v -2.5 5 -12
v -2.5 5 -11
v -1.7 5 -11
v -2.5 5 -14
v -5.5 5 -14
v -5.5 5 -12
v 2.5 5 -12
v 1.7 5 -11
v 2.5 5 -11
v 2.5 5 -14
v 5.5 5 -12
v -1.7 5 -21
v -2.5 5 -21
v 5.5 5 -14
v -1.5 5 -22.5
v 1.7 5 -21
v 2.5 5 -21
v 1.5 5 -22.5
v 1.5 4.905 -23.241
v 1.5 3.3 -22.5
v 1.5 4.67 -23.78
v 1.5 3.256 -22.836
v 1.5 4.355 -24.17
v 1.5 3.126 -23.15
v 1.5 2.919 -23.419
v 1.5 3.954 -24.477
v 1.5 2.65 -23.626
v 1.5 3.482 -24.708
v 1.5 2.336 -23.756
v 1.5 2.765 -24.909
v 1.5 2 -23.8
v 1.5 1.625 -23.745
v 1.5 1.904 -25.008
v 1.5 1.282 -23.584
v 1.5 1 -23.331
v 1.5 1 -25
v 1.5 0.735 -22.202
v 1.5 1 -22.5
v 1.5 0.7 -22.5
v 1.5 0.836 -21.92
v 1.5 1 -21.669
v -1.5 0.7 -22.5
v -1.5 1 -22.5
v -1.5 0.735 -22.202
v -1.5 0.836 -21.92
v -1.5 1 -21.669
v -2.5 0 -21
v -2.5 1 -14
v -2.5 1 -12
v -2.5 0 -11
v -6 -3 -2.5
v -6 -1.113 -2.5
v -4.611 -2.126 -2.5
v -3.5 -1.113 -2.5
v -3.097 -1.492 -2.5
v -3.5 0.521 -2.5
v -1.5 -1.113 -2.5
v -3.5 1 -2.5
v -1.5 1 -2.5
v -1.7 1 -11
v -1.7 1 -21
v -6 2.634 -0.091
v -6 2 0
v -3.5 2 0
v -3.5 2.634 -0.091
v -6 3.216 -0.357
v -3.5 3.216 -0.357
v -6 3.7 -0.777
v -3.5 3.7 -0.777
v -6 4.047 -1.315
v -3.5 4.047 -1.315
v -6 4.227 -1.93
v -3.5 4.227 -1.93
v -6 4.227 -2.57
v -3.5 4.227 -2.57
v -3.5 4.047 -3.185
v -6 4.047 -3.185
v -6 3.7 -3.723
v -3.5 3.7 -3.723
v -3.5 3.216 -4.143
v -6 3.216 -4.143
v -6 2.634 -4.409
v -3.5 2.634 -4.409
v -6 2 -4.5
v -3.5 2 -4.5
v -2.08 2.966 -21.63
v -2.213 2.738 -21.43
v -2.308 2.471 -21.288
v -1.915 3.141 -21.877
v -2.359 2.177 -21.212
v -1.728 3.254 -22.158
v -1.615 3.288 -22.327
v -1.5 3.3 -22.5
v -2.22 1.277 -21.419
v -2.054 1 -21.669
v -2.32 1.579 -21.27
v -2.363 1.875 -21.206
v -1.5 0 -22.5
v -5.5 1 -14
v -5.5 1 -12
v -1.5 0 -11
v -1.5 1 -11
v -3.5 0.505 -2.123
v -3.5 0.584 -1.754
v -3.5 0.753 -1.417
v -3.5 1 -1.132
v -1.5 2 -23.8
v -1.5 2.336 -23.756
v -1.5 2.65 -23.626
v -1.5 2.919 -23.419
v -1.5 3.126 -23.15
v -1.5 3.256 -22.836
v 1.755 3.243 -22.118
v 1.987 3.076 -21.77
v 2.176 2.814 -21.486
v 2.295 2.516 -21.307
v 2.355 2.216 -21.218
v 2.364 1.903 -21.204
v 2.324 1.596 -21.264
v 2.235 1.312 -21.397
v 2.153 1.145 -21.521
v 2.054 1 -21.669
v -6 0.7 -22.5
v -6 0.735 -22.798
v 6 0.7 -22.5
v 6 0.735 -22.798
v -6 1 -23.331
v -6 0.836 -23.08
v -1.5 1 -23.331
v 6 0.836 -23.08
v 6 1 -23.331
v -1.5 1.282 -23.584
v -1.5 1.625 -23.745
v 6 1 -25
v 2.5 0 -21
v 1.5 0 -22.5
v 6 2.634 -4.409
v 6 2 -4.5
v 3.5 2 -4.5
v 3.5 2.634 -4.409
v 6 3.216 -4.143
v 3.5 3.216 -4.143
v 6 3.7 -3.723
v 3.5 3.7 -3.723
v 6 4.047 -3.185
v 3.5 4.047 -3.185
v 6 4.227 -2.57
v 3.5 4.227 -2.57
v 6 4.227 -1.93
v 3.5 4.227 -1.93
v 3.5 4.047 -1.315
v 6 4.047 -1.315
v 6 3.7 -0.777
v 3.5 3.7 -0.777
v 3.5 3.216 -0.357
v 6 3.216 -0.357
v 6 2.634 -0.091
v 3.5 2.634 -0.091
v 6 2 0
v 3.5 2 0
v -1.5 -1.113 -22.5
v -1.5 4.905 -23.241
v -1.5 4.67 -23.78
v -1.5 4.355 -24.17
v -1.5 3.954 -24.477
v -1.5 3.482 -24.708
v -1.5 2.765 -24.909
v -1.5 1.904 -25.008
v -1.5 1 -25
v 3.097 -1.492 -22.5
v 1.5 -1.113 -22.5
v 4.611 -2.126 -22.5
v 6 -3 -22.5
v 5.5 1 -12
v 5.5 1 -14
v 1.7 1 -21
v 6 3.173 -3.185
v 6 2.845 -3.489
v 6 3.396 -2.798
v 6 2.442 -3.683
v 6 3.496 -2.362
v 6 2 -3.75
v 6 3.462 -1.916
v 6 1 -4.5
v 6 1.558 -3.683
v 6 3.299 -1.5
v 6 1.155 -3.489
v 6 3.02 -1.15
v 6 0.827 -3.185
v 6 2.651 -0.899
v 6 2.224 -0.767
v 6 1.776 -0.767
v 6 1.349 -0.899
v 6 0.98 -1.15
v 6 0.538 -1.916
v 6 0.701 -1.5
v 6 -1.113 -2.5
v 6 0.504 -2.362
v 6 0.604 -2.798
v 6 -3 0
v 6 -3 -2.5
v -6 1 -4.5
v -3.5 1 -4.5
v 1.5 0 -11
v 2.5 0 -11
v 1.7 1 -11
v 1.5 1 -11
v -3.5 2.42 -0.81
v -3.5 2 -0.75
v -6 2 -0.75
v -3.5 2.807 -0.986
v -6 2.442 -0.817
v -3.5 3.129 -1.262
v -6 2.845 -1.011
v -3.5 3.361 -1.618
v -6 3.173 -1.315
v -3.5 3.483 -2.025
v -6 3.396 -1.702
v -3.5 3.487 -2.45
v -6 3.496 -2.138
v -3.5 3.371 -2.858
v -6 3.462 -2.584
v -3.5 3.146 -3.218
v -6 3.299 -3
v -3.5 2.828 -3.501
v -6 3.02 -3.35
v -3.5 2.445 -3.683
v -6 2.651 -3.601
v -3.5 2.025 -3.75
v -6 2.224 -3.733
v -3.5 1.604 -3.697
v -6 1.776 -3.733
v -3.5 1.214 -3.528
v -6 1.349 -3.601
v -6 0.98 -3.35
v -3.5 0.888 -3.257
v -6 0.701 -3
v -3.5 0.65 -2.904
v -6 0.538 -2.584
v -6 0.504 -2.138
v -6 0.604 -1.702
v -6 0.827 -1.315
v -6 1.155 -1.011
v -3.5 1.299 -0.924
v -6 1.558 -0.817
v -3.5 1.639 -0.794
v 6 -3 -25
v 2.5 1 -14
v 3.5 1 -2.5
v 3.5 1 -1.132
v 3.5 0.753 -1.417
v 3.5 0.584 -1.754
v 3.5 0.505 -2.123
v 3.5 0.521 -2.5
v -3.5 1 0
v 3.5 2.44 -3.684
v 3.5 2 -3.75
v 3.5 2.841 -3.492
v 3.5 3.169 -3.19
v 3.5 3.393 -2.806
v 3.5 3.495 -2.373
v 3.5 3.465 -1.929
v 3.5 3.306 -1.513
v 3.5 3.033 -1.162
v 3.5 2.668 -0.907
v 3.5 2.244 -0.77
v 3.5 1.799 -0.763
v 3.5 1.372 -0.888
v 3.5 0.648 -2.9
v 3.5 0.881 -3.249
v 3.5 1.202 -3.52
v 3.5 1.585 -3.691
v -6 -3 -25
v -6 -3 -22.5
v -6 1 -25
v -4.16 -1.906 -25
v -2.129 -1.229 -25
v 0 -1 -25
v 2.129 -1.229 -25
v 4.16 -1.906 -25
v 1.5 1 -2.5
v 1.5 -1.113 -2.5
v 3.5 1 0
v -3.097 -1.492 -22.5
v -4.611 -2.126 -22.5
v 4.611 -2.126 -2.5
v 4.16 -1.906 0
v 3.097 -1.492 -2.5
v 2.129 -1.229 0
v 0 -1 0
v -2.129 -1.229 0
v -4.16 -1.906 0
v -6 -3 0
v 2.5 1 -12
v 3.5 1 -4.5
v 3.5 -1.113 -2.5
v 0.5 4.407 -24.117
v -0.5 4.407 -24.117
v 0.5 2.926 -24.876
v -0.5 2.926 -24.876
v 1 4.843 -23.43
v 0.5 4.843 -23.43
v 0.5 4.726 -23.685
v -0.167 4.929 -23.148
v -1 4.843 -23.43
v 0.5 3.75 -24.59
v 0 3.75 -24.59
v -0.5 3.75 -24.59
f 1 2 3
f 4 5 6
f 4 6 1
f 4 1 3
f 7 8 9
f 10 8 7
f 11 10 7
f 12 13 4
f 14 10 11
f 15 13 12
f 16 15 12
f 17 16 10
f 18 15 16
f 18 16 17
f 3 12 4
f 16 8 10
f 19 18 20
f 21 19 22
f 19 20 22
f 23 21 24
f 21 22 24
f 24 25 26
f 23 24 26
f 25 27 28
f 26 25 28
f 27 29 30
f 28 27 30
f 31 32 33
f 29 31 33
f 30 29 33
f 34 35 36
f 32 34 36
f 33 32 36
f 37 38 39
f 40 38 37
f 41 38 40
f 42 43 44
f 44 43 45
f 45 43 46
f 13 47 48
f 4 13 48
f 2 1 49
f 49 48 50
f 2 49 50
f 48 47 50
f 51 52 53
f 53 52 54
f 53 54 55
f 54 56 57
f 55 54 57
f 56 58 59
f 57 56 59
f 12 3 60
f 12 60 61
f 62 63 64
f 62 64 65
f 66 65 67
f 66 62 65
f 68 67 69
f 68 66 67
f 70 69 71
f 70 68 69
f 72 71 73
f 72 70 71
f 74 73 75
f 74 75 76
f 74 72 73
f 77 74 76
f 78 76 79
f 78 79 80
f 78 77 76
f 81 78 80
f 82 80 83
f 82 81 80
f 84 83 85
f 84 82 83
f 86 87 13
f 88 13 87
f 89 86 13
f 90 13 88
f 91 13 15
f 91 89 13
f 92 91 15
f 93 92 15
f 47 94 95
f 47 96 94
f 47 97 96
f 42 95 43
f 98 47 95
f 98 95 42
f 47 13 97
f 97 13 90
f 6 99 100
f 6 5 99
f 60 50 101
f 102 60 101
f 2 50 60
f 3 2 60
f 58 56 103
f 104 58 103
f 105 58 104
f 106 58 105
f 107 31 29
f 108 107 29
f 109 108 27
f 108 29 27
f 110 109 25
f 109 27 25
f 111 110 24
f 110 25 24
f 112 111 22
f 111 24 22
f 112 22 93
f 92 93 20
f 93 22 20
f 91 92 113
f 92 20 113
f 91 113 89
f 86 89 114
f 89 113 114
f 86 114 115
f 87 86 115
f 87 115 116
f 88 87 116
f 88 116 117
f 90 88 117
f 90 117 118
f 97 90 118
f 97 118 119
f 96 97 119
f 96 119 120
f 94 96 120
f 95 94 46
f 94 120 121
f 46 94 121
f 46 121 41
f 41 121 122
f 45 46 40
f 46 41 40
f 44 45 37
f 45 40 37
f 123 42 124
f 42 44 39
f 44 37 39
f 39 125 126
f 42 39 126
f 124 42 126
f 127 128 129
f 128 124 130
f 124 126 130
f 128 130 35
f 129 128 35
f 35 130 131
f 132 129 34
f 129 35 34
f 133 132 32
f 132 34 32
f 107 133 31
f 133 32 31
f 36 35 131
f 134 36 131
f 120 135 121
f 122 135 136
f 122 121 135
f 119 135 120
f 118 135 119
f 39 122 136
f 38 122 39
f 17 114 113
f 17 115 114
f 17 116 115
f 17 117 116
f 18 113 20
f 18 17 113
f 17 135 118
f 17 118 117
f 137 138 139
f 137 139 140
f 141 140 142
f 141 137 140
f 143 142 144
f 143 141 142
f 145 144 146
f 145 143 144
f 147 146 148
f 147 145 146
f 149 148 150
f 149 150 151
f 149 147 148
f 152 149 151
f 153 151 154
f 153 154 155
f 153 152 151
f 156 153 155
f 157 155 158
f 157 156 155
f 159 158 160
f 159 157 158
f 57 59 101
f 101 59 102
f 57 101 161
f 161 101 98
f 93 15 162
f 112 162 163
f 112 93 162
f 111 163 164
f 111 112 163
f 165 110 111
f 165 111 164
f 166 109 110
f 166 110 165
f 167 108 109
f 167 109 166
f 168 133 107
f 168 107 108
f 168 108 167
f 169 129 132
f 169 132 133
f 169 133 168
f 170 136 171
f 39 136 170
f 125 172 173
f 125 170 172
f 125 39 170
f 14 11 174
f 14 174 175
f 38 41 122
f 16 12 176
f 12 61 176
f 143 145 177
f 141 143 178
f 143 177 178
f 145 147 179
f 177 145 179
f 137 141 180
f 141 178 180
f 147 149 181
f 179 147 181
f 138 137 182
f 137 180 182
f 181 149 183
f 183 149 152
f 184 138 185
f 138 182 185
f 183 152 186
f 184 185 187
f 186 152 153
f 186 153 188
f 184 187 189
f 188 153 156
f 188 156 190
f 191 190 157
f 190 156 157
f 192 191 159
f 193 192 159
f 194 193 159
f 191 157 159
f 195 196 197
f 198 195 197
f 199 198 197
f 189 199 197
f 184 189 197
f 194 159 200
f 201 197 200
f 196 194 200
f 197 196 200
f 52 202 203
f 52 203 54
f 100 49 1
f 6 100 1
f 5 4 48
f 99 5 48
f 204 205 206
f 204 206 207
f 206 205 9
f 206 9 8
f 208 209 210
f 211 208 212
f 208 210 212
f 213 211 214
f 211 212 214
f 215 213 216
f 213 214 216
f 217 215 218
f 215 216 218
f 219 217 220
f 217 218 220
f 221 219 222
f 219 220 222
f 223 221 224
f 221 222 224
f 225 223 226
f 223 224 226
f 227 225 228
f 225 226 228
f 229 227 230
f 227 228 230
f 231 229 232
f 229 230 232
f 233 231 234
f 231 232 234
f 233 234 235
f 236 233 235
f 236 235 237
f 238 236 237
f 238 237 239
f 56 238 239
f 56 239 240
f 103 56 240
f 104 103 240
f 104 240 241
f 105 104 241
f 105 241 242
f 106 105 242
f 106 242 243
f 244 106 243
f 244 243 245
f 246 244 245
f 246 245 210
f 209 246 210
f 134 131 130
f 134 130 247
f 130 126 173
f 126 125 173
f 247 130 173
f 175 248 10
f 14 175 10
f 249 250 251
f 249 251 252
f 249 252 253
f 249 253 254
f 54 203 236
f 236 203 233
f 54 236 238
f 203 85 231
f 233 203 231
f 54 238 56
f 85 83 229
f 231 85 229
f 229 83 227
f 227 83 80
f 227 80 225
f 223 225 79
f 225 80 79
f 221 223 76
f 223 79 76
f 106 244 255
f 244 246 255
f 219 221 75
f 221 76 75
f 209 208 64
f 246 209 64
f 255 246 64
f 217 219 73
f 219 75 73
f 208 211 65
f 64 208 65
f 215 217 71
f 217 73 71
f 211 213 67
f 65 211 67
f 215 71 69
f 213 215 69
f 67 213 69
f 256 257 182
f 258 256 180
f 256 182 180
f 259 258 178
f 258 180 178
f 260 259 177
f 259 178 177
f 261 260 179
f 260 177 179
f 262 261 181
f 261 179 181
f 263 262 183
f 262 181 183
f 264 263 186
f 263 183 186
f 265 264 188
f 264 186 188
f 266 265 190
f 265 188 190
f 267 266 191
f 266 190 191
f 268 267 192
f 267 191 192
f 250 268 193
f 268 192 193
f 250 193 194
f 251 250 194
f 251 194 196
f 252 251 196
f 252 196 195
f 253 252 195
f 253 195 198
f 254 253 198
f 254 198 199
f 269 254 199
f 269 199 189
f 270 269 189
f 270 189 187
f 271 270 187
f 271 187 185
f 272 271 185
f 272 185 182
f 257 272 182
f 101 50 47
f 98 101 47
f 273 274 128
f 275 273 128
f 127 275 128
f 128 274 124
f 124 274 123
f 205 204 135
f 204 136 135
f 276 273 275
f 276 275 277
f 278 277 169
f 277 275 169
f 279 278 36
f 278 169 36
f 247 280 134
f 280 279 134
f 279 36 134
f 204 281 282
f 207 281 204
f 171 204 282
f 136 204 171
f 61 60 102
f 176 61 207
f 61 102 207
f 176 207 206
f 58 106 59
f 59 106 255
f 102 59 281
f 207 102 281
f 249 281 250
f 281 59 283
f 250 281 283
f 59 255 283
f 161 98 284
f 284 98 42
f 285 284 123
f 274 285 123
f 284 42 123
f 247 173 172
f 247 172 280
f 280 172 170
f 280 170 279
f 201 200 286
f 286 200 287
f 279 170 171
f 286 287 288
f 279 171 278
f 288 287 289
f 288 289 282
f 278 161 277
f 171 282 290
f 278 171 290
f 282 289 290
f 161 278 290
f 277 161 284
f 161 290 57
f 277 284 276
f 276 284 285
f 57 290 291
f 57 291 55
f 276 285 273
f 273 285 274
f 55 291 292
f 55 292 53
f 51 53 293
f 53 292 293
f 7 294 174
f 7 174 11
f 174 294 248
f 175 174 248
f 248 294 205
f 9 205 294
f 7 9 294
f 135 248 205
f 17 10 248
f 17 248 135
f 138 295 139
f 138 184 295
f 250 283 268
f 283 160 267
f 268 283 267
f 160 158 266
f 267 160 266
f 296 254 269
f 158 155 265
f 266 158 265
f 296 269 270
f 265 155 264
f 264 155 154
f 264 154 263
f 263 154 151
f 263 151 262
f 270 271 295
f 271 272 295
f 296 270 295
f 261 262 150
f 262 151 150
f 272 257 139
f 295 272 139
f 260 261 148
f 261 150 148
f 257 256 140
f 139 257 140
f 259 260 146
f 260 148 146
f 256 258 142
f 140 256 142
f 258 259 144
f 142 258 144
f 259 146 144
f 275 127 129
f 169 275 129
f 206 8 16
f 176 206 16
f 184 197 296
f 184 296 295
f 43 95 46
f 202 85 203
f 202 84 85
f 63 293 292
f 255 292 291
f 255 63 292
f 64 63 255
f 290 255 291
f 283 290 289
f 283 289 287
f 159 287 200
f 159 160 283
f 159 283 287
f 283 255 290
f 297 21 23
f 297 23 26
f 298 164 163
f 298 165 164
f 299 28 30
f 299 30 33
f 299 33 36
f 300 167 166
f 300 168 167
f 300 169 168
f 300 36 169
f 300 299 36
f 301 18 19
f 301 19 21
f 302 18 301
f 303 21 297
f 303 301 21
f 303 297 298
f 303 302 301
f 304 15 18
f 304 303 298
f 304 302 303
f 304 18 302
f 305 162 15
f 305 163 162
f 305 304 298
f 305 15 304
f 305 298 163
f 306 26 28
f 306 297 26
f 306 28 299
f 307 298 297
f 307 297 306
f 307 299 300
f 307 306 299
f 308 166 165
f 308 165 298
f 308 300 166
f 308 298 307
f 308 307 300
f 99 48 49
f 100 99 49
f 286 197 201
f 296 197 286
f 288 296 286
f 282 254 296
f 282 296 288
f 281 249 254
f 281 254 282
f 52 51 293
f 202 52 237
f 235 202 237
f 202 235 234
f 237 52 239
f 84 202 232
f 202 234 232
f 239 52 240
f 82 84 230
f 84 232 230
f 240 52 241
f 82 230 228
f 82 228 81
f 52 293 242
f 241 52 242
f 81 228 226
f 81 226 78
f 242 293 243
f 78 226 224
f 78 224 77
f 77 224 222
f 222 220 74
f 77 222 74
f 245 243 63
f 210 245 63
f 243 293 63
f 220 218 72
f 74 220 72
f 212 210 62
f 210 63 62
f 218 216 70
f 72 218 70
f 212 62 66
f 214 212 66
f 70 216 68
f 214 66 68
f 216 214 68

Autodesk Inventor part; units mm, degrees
ref_plane "YZ Plane" through (0, 0, 0) normal (1, 0, 0) x (0, 1, 0)
ref_plane "XZ Plane" through (0, 0, 0) normal (0, 1, 0) x (-1, 0, 0)
sketch "Sketch1" plane through (0, 0, 0) normal (0, 0, 1) x (1, 0, 0)
  line L0 (-6, 1) -> (6, 1)
  line L1 (6, 1) -> (6, -1)
  line L2 (6, -1) -> (-6, -1)
  line L3 (-6, -1) -> (-6, 1)
  line L4 (-6, 1) -> (6, -1) construction
  line L5 (6, 1) -> (-6, -1) construction
  line L6 (-6, -1) -> (-6, -3)
  line L7 (6, -1) -> (6, -3)
  arc A0 (6, -3) -> (-6, -3) centre (0, -11) ccw
  point P0 (0, 0)
  dimension "d0" = 12
  dimension "d1" = 2
  dimension "d2" = 2
  dimension "d3" = 2
extrude "Extrusion1" add sketch "Sketch1" against normal blind 25
sketch "Sketch2" plane through (-6, 1, 0) normal (0, 1, 0) x (1, 0, 0)
  line L0 (12, 0) -> (12, 25) projected
  line L1 (0, 0) -> (0, 25) projected
  line L2 (0, 0) -> (0, 2.5)
  line L3 (12, 0) -> (12, 2.5)
  line L4 (0, 25) -> (0, 22.5)
  line L5 (12, 25) -> (12, 22.5)
  line L6 (0, 2.5) -> (4.5, 2.5)
  line L7 (4.5, 2.5) -> (4.5, 22.5)
  line L8 (4.5, 22.5) -> (0, 22.5)
  line L9 (0, 22.5) -> (0, 2.5)
  line L10 (12, 2.5) -> (7.5, 2.5)
  line L11 (7.5, 2.5) -> (7.5, 22.5)
  line L12 (7.5, 22.5) -> (12, 22.5)
  line L13 (12, 22.5) -> (12, 2.5)
  point P0 (6, 0)
  dimension "d6" = 2.5
  dimension "d7" = 2.5
  dimension "d8" = 2.5
  dimension "d9" = 2.5
  dimension "d10" = 12
  dimension "d11" = 4.5
  dimension "d12" = 4.5
extrude "Extrusion2" cut sketch "Sketch2" against normal blind 25
sketch "Sketch3" plane through (-6, 1, 0) normal (0, 1, 0) x (1, 0, 0)
  line L0 (7.5, 2.5) -> (7.5, 22.5) projected
  line L1 (4.5, 22.5) -> (4.5, 2.5) projected
  line L2 (0, 0) -> (0, 2.5) projected
  line L3 (4.5, 2.5) -> (4.5, 3.5)
  line L4 (7.5, 2.5) -> (7.5, 3.5)
  line L5 (4.5, 3.5) -> (4.5, 5)
  line L6 (4.5, 5) -> (5, 5)
  line L7 (5, 5) -> (5, 3.5)
  line L8 (5, 3.5) -> (4.5, 3.5)
  line L9 (7.5, 3.5) -> (7.5, 5)
  line L10 (7.5, 5) -> (7, 5)
  line L11 (7, 5) -> (7, 3.5)
  line L12 (7, 3.5) -> (7.5, 3.5)
  line L13 (4.5, 2.5) -> (4.5, 7)
  line L14 (4.5, 7) -> (0, 7)
  line L15 (0, 7) -> (0, 8.5)
  line L16 (0, 8.5) -> (4.5, 8.5)
  line L17 (7.5, 7) -> (12, 7)
  line L18 (12, 7) -> (12, 8.5)
  line L19 (12, 8.5) -> (7.5, 8.5)
  line L20 (4.5, 7) -> (4.5, 21)
  line L21 (7.5, 7) -> (7.5, 21)
  line L22 (4.5, 21) -> (7.5, 21)
  line L23 (7.5, 21) -> (7.5, 22.5)
  line L24 (7.5, 22.5) -> (4.5, 22.5)
  line L25 (4.5, 22.5) -> (4.5, 21)
  line L26 (4.5, 21) -> (3.5, 21)
  line L27 (3.5, 21) -> (3.5, 11)
  line L28 (3.5, 11) -> (4.5, 11)
  line L29 (4.5, 11) -> (4.5, 21)
  line L30 (7.5, 21) -> (8.5, 21)
  line L31 (8.5, 21) -> (8.5, 11)
  line L32 (8.5, 11) -> (7.5, 11)
  line L33 (7.5, 11) -> (7.5, 21)
  line L34 (3.5, 21) -> (4.5, 22.5)
  line L35 (7.5, 22.5) -> (8.5, 21)
  line L36 (7.5, 5) -> (8, 5)
  line L37 (8, 5) -> (8, 3.5)
  line L38 (8, 3.5) -> (7.5, 3.5)
  line L39 (4.5, 5) -> (4, 5)
  line L40 (4, 5) -> (4, 3.5)
  line L41 (4, 3.5) -> (5, 3.5)
  point P0 (12, 25)
  point P1 (12, 0)
  point P2 (6, 0)
  dimension "d15" = 1
  dimension "d16" = 1.5
  dimension "d17" = 0.5
  dimension "d18" = 0.5
  dimension "d19" = 4.5
  dimension "d20" = 1.5
  dimension "d21" = 14
  dimension "d22" = 4.5
  dimension "d23" = 4.5
  dimension "d24" = 14
  dimension "d25" = 25
  dimension "d26" = 1.5
  dimension "d29" = 1
  dimension "d30" = 10
  dimension "d31" = 1
  dimension "d34" = 0.5
  dimension "d35" = 0.5
  dimension "d50" = 10
extrude "Extrusion3" add sketch "Sketch3" along normal blind 4 contours L0 L30 L31 L32 | L22 L1 L24 L0 | L0 L35 L30 | L26 L34 L1 | L1 L28 L27 L26
ref_plane "Work Plane1" through (-1.5, 1, -12.5) normal (-1, 0, 0) x (0, 0, 1)
sketch "Sketch8" plane through (-2.5, -1.3175, -11) normal (-1, 0, 0) x (0, 0, 1)
  line L0 (-10, 6.3175) -> (-11.5, 6.3175) projected
  line L1 (0, 0) -> (-10, 0) projected
  line L2 (0, 2.3175) -> (0, 6.3175) projected
  line L3 (-10, 6.3175) -> (0, 6.3175) projected
  line L4 (-10, 2.3175) -> (0, 2.3175) projected
  line L5 (-3, 6.3175) -> (-1, 6.3175)
  line L6 (-3, 2.3175) -> (-1, 2.3175)
  line L7 (0, 2.3175) -> (-10, 2.3175) projected
  line L8 (0, 2.3175) -> (-10, 2.3175) projected
  line L9 (-3, 6.3175) -> (-3, 2.3175)
  line L10 (-1, 2.3175) -> (-1, 6.3175)
  point P0 (11, 1.3175)
  dimension "d119" = 4
  dimension "d120" = 4
  dimension "d126" = 1
  dimension "d127" = 2
sketch "Sketch9" plane through (2.5, -1.3175, -21) normal (1, 0, 0) x (0, 0, -1)
  line L0 (0, 2.3175) -> (0, 6.3175) projected
  line L1 (0, 0) -> (-10, 0) projected
  line L2 (-10, 2.3175) -> (0, 2.3175) projected
  line L3 (-9, 2.3175) -> (-9, 6.3175) projected
  line L4 (-9, 5.1588) -> (-9, 6.3175)
  line L5 (-9, 6.3175) -> (-7, 6.3175)
  line L6 (-10, 6.3175) -> (0, 6.3175) projected
  line L7 (-9, 6.3175) -> (-9, 2.3175)
  line L8 (-9, 2.3175) -> (-7, 2.3175)
  line L9 (-10, 6.3175) -> (0, 6.3175) projected
  line L10 (0, 6.3175) -> (-10, 6.3175) projected
  line L11 (-10, 6.3175) -> (-9, 6.3175)
  line L12 (-7, 2.3175) -> (-7, 6.3175) projected
  line L13 (-7, 6.3175) -> (-7, 2.3175)
  point P0 (-21, 1.3175)
  point P1 (-9, 1.1588)
  dimension "d121" = 4
  dimension "d122" = 1
  dimension "d123" = 2
ref_plane "Work Plane2" through (-1.5, 5, -11) normal (-1, 0, 0) x (0, 0, -1)
sketch "Sketch12" plane through (-1.5, 5, -11) normal (-1, 0, 0) x (0, 0, -1)
  line L0 (11.5, 4) -> (11.5, 0) projected
  line L1 (14, 8) -> (14, 4) projected
  line L2 (14, 4) -> (11.5, 0)
  line L3 (11.5, 4) -> (14, 4) projected
  line L4 (14, 0) -> (11.5, 0)
  line L5 (11.5, 0) -> (13.6217, 0) construction
  line L6 (13.6217, 0) -> (14.1176, 2) construction
  line L7 (14.1176, 2) -> (14, 4) construction
  spline S0 degree 3 poles (11.5, 0) (13.6217, 0) (14.1176, 2) (14, 4) knots 1 1 1 1 2 2 2 2
  point P0 (-11, 5)
extrude "Extrusion12" add sketch "Sketch12" against normal up to surface (3 mm away)
sketch "Sketch15" plane through (2.5, -1.3175, -21) normal (1, 0, 0) x (0, 0, -1)
  line L0 (1.5, 2.3175) -> (4, 2.3175) projected
  line L1 (1.5, 2.3175) -> (1.5, 6.3175) projected
  line L2 (4, 2.3175) -> (1.5, 2.3175) projected
  line L3 (1.5, 2.3175) -> (1.5, 3.3175)
  circle A0 centre (1.5, 3.3175) radius 1.3
  point P0 (-21, 1.3175)
  dimension "d77" = 1
  dimension "d78" = 2.6
extrude "Extrusion14" cut sketch "Sketch15" against normal up to surface (12 mm away) from surface at 3.5
sketch "Sketch16" plane through (-6, 5, 0) normal (0, 1, 0) x (1, 0, 0)
  line L0 (3.5, 11) -> (4.5, 11) projected
  line L1 (4.5, 11) -> (4.5, 21) projected
  line L2 (7.5, 21) -> (7.5, 11) projected
  line L3 (7.5, 11) -> (8.5, 11) projected
  line L4 (4.5, 11) -> (4.3, 11)
  line L5 (4.3, 11) -> (4.3, 21)
  line L6 (4.3, 21) -> (4.5, 21)
  line L7 (7.5, 11) -> (7.5, 21) projected
  line L8 (7.5, 11) -> (7.7, 11)
  line L9 (7.7, 11) -> (7.7, 21)
  line L10 (7.7, 21) -> (7.5, 21)
  line L11 (7.5, 21) -> (7.5, 11)
  point P0 (6, 0)
  dimension "d81" = 0.2
  dimension "d82" = 0.2
  dimension "d83" = 0.2
extrude "Extrusion15" cut sketch "Sketch16" against normal up to surface (4 mm away)
sketch "Sketch20" plane through (6, -3, 0) normal (1, 0, 0) x (0, 0, -1)
  line L0 (0, 4) -> (2.5, 4) projected
  line L1 (0, 4) -> (4.5, 4)
  arc A0 (4.5, 5) -> (0, 5) centre (2.25, 5) ccw projected
  line L2 (4.5, 4) -> (4.5, 5)
  line L3 (0, 4) -> (0, 5) projected
  line L4 (0, 4) -> (0, 5)
  arc A1 (4.5, 5) -> (0, 5) centre (2.25, 5) ccw
  line L5 (22.5, 1.8869) -> (2.5, 1.8869) projected
  line L6 (2.5, 1.8869) -> (4.5, 4)
  line L7 (2.5, 1.8869) -> (22.5, 1.8869) projected
  line L8 (21, 4) -> (2.5, 4) projected
  line L9 (2.5, 1.8869) -> (2.5, 4)
  point P0 (0, 3)
extrude "Extrusion18" add sketch "Sketch20" against normal blind 2.5
sketch "Sketch21" plane through (-6, -3, 0) normal (-1, 0, 0) x (0, 0, 1)
  arc A0 (0, 5) -> (-4.5, 5) centre (-2.25, 5) ccw projected
  line L0 (-4.5, 5) -> (-4.5, 4) projected
  line L1 (-21, 4) -> (-2.5, 4) projected
  line L2 (0, 4) -> (0, 5) projected
  line L3 (0, 4) -> (-4.5, 4)
  line L4 (-4.5, 5) -> (-4.5, 4)
  line L5 (0, 0) -> (0, 5) projected
  line L6 (0, 4) -> (0, 5)
  arc A1 (0, 5) -> (-4.5, 5) centre (-2.25, 5) ccw
  line L7 (-2.5, 4) -> (-2.5, 0) projected
  line L8 (-2.5, 1.8869) -> (-22.5, 1.8869) projected
  line L9 (-4.5, 4) -> (-2.5, 1.8869) projected
  line L10 (-4.5, 4) -> (-2.5, 1.8869)
  line L11 (-2.5, 1.8869) -> (-2.5, 4)
  point P0 (0, 3)
extrude "Extrusion19" add sketch "Sketch21" against normal blind 2.5
sketch "Sketch22" plane through (6, -3, 0) normal (1, 0, 0) x (0, 0, -1)
  arc A0 (4.5, 5) -> (0, 5) centre (2.25, 5) ccw projected
  circle A1 centre (2.25, 5) radius 1.5
  point P0 (0, 3)
  dimension "d111" = 3
extrude "Extrusion20" cut sketch "Sketch22" against normal up to surface (2.5 mm away)
sketch "Sketch23" plane through (-6, -3, -2.5) normal (-1, 0, 0) x (0, 0, 1)
  arc A0 (2.5, 5) -> (-2, 5) centre (0.25, 5) ccw projected
  circle A1 centre (0.25, 5) radius 1.5
  point P0 (2.5, 3)
  dimension "d114" = 3
extrude "Extrusion21" cut sketch "Sketch23" against normal up to surface (2.5 mm away)
sketch "Sketch24" plane through (-6, 1, 0) normal (0, -1, 0) x (1, 0, 0)
  line L0 (4.3, -21) -> (4.3, -11) projected
  line L1 (3.5, -11) -> (4.3, -11) projected
  line L2 (3.5, -21) -> (3.5, -11) projected
  line L3 (3.9462, -21.6693) -> (3.5, -21) projected
  line L4 (3.9462, -21.6693) -> (4.5, -21.6693) projected
  line L5 (4.5, -21.6693) -> (4.5, -21) projected
  line L6 (4.5, -21) -> (4.3, -21) projected
  line L7 (7.5, -22.5) -> (7.5, -2.5) projected
  line L8 (7.7, -21) -> (7.5, -21) projected
  line L9 (7.5, -21) -> (7.5, -21.6693) projected
  line L10 (7.5, -21.6693) -> (8.0538, -21.6693) projected
  line L11 (8.5, -21) -> (8.0538, -21.6693) projected
  line L12 (8.5, -11) -> (8.5, -21) projected
  line L13 (7.7, -11) -> (8.5, -11) projected
  line L14 (7.7, -11) -> (7.7, -21) projected
  line L15 (0, -23.3307) -> (4.5, -23.3307) projected
  line L16 (0, -22.5) -> (0, -23.3307) projected
  line L17 (4.5, -22.5) -> (0, -22.5) projected
  line L18 (4.5, -21.6693) -> (4.5, -22.5) projected
  line L19 (3.9462, -21.6693) -> (4.5, -21.6693) projected
  line L20 (4.5, -22.5) -> (3.9462, -21.6693) projected
  line L21 (4.5, -23.3307) -> (4.5, -22.5) projected
  line L22 (7.5, -23.3307) -> (12, -23.3307) projected
  line L23 (7.5, -22.5) -> (7.5, -23.3307) projected
  line L24 (8.0538, -21.6693) -> (7.5, -22.5) projected
  line L25 (7.5, -21.6693) -> (8.0538, -21.6693) projected
  line L26 (7.5, -22.5) -> (7.5, -21.6693) projected
  line L27 (12, -22.5) -> (7.5, -22.5) projected
  line L28 (12, -23.3307) -> (12, -22.5) projected
  line L29 (7.5, -2.5) -> (12, -2.5) projected
  line L30 (12, 0) -> (12, -2.5) projected
  line L31 (0, 0) -> (12, 0) projected
  line L32 (0, 0) -> (0, -2.5) projected
  line L33 (0, -2.5) -> (4.5, -2.5) projected
  line L34 (4.5, -2.5) -> (4.5, -22.5) projected
  line L35 (4.5, -22.5) -> (0, -22.5) projected
  line L36 (0, -22.5) -> (0, -25) projected
  line L37 (12, -25) -> (0, -25) projected
  line L38 (12, -22.5) -> (12, -25) projected
  line L39 (12, -22.5) -> (7.5, -22.5) projected
  line L40 (7.5, -22.5) -> (7.5, -2.5) projected
  line L41 (7.5, -2.5) -> (12, -2.5) projected
  line L42 (12, 0) -> (12, -2.5) projected
  line L43 (0, 0) -> (12, 0) projected
  line L44 (0, 0) -> (0, -2.5) projected
  line L45 (0, -2.5) -> (4.5, -2.5) projected
  line L46 (4.5, -2.5) -> (4.5, -22.5) projected
  line L47 (4.5, -22.5) -> (0, -22.5) projected
  line L48 (0, -22.5) -> (0, -25) projected
  line L49 (12, -25) -> (0, -25) projected
  line L50 (12, -22.5) -> (12, -25) projected
  line L51 (12, -22.5) -> (7.5, -22.5) projected
  line L52 (7.5, -22.5) -> (7.5, -2.5) projected
  line L53 (4.5, -30) -> (4.5, 5) projected
  line L54 (8.5, -11) -> (7.5, -11)
  line L55 (7.5, -2.5) -> (7.5, -21) projected
  line L56 (7.5, -22.5) -> (4.5, -22.5) projected
  line L57 (7.5, -11) -> (7.5, -22.5)
  line L58 (8.3667, -21.2) -> (7.5, -22.5) projected
  line L59 (7.5, -22.5) -> (8.5, -21)
  line L60 (8.5, -11) -> (8.5, -21) projected
  line L61 (8.5, -11) -> (8.5, -21) projected
  line L62 (8.5, -11) -> (8.5, -21)
  line L63 (7.5, -11) -> (7.5, -22.5)
  line L64 (3.5, -21) -> (3.5, -11) projected
  line L65 (3.5, -11) -> (3.5, -21)
  line L66 (3.5, -21) -> (3.5, -11) projected
  line L67 (3.5, -21) -> (4.5, -22.5)
  line L68 (3.5, -11) -> (4.5, -11)
  line L69 (3.5, -21) -> (4.5, -22.5)
  line L70 (4.5, -22.5) -> (4.5, -11)
  line L71 (4.5, -2.5) -> (4.5, -22.5) projected
  line L72 (4.5, -11) -> (4.5, -22.5)
  point P0 (6, 0)
  point P1 (3.5, -12)
  point P2 (3.5, -14)
  point P3 (8.5, -14)
  point P4 (8.5, -12)
extrude "Extrusion22" add sketch "Sketch24" along normal blind 1 contours L6 L5 L4 L3 L2 L1 L0 | L0 L68 L34 L6 | L18 L20 L4 | L7 L10 L24 | L7 L8 L14 L13 L12 L11 L10 | L7 L54 L14 L8
extrude "Extrusion23" add sketch "Sketch9" along normal blind 3 contours L2 L3 L5 L12
extrude "Extrusion24" add sketch "Sketch8" along normal blind 3 contours L4 L9 L3 L10
equation "\"d7\" = d6"
equation "\"d8\" = d6"
equation "\"d9\" = d6"
equation "\"d12\" = d11"
equation "\"d18\" = d17"
equation "\"d22\" = d23"
equation "\"d24\" = d21"
equation "\"d31\" = d29"
equation "\"d34\" = d17"
equation "\"d50\" = d30"
equation "\"d82\" = d81"
properties part number "back_pack_5"
